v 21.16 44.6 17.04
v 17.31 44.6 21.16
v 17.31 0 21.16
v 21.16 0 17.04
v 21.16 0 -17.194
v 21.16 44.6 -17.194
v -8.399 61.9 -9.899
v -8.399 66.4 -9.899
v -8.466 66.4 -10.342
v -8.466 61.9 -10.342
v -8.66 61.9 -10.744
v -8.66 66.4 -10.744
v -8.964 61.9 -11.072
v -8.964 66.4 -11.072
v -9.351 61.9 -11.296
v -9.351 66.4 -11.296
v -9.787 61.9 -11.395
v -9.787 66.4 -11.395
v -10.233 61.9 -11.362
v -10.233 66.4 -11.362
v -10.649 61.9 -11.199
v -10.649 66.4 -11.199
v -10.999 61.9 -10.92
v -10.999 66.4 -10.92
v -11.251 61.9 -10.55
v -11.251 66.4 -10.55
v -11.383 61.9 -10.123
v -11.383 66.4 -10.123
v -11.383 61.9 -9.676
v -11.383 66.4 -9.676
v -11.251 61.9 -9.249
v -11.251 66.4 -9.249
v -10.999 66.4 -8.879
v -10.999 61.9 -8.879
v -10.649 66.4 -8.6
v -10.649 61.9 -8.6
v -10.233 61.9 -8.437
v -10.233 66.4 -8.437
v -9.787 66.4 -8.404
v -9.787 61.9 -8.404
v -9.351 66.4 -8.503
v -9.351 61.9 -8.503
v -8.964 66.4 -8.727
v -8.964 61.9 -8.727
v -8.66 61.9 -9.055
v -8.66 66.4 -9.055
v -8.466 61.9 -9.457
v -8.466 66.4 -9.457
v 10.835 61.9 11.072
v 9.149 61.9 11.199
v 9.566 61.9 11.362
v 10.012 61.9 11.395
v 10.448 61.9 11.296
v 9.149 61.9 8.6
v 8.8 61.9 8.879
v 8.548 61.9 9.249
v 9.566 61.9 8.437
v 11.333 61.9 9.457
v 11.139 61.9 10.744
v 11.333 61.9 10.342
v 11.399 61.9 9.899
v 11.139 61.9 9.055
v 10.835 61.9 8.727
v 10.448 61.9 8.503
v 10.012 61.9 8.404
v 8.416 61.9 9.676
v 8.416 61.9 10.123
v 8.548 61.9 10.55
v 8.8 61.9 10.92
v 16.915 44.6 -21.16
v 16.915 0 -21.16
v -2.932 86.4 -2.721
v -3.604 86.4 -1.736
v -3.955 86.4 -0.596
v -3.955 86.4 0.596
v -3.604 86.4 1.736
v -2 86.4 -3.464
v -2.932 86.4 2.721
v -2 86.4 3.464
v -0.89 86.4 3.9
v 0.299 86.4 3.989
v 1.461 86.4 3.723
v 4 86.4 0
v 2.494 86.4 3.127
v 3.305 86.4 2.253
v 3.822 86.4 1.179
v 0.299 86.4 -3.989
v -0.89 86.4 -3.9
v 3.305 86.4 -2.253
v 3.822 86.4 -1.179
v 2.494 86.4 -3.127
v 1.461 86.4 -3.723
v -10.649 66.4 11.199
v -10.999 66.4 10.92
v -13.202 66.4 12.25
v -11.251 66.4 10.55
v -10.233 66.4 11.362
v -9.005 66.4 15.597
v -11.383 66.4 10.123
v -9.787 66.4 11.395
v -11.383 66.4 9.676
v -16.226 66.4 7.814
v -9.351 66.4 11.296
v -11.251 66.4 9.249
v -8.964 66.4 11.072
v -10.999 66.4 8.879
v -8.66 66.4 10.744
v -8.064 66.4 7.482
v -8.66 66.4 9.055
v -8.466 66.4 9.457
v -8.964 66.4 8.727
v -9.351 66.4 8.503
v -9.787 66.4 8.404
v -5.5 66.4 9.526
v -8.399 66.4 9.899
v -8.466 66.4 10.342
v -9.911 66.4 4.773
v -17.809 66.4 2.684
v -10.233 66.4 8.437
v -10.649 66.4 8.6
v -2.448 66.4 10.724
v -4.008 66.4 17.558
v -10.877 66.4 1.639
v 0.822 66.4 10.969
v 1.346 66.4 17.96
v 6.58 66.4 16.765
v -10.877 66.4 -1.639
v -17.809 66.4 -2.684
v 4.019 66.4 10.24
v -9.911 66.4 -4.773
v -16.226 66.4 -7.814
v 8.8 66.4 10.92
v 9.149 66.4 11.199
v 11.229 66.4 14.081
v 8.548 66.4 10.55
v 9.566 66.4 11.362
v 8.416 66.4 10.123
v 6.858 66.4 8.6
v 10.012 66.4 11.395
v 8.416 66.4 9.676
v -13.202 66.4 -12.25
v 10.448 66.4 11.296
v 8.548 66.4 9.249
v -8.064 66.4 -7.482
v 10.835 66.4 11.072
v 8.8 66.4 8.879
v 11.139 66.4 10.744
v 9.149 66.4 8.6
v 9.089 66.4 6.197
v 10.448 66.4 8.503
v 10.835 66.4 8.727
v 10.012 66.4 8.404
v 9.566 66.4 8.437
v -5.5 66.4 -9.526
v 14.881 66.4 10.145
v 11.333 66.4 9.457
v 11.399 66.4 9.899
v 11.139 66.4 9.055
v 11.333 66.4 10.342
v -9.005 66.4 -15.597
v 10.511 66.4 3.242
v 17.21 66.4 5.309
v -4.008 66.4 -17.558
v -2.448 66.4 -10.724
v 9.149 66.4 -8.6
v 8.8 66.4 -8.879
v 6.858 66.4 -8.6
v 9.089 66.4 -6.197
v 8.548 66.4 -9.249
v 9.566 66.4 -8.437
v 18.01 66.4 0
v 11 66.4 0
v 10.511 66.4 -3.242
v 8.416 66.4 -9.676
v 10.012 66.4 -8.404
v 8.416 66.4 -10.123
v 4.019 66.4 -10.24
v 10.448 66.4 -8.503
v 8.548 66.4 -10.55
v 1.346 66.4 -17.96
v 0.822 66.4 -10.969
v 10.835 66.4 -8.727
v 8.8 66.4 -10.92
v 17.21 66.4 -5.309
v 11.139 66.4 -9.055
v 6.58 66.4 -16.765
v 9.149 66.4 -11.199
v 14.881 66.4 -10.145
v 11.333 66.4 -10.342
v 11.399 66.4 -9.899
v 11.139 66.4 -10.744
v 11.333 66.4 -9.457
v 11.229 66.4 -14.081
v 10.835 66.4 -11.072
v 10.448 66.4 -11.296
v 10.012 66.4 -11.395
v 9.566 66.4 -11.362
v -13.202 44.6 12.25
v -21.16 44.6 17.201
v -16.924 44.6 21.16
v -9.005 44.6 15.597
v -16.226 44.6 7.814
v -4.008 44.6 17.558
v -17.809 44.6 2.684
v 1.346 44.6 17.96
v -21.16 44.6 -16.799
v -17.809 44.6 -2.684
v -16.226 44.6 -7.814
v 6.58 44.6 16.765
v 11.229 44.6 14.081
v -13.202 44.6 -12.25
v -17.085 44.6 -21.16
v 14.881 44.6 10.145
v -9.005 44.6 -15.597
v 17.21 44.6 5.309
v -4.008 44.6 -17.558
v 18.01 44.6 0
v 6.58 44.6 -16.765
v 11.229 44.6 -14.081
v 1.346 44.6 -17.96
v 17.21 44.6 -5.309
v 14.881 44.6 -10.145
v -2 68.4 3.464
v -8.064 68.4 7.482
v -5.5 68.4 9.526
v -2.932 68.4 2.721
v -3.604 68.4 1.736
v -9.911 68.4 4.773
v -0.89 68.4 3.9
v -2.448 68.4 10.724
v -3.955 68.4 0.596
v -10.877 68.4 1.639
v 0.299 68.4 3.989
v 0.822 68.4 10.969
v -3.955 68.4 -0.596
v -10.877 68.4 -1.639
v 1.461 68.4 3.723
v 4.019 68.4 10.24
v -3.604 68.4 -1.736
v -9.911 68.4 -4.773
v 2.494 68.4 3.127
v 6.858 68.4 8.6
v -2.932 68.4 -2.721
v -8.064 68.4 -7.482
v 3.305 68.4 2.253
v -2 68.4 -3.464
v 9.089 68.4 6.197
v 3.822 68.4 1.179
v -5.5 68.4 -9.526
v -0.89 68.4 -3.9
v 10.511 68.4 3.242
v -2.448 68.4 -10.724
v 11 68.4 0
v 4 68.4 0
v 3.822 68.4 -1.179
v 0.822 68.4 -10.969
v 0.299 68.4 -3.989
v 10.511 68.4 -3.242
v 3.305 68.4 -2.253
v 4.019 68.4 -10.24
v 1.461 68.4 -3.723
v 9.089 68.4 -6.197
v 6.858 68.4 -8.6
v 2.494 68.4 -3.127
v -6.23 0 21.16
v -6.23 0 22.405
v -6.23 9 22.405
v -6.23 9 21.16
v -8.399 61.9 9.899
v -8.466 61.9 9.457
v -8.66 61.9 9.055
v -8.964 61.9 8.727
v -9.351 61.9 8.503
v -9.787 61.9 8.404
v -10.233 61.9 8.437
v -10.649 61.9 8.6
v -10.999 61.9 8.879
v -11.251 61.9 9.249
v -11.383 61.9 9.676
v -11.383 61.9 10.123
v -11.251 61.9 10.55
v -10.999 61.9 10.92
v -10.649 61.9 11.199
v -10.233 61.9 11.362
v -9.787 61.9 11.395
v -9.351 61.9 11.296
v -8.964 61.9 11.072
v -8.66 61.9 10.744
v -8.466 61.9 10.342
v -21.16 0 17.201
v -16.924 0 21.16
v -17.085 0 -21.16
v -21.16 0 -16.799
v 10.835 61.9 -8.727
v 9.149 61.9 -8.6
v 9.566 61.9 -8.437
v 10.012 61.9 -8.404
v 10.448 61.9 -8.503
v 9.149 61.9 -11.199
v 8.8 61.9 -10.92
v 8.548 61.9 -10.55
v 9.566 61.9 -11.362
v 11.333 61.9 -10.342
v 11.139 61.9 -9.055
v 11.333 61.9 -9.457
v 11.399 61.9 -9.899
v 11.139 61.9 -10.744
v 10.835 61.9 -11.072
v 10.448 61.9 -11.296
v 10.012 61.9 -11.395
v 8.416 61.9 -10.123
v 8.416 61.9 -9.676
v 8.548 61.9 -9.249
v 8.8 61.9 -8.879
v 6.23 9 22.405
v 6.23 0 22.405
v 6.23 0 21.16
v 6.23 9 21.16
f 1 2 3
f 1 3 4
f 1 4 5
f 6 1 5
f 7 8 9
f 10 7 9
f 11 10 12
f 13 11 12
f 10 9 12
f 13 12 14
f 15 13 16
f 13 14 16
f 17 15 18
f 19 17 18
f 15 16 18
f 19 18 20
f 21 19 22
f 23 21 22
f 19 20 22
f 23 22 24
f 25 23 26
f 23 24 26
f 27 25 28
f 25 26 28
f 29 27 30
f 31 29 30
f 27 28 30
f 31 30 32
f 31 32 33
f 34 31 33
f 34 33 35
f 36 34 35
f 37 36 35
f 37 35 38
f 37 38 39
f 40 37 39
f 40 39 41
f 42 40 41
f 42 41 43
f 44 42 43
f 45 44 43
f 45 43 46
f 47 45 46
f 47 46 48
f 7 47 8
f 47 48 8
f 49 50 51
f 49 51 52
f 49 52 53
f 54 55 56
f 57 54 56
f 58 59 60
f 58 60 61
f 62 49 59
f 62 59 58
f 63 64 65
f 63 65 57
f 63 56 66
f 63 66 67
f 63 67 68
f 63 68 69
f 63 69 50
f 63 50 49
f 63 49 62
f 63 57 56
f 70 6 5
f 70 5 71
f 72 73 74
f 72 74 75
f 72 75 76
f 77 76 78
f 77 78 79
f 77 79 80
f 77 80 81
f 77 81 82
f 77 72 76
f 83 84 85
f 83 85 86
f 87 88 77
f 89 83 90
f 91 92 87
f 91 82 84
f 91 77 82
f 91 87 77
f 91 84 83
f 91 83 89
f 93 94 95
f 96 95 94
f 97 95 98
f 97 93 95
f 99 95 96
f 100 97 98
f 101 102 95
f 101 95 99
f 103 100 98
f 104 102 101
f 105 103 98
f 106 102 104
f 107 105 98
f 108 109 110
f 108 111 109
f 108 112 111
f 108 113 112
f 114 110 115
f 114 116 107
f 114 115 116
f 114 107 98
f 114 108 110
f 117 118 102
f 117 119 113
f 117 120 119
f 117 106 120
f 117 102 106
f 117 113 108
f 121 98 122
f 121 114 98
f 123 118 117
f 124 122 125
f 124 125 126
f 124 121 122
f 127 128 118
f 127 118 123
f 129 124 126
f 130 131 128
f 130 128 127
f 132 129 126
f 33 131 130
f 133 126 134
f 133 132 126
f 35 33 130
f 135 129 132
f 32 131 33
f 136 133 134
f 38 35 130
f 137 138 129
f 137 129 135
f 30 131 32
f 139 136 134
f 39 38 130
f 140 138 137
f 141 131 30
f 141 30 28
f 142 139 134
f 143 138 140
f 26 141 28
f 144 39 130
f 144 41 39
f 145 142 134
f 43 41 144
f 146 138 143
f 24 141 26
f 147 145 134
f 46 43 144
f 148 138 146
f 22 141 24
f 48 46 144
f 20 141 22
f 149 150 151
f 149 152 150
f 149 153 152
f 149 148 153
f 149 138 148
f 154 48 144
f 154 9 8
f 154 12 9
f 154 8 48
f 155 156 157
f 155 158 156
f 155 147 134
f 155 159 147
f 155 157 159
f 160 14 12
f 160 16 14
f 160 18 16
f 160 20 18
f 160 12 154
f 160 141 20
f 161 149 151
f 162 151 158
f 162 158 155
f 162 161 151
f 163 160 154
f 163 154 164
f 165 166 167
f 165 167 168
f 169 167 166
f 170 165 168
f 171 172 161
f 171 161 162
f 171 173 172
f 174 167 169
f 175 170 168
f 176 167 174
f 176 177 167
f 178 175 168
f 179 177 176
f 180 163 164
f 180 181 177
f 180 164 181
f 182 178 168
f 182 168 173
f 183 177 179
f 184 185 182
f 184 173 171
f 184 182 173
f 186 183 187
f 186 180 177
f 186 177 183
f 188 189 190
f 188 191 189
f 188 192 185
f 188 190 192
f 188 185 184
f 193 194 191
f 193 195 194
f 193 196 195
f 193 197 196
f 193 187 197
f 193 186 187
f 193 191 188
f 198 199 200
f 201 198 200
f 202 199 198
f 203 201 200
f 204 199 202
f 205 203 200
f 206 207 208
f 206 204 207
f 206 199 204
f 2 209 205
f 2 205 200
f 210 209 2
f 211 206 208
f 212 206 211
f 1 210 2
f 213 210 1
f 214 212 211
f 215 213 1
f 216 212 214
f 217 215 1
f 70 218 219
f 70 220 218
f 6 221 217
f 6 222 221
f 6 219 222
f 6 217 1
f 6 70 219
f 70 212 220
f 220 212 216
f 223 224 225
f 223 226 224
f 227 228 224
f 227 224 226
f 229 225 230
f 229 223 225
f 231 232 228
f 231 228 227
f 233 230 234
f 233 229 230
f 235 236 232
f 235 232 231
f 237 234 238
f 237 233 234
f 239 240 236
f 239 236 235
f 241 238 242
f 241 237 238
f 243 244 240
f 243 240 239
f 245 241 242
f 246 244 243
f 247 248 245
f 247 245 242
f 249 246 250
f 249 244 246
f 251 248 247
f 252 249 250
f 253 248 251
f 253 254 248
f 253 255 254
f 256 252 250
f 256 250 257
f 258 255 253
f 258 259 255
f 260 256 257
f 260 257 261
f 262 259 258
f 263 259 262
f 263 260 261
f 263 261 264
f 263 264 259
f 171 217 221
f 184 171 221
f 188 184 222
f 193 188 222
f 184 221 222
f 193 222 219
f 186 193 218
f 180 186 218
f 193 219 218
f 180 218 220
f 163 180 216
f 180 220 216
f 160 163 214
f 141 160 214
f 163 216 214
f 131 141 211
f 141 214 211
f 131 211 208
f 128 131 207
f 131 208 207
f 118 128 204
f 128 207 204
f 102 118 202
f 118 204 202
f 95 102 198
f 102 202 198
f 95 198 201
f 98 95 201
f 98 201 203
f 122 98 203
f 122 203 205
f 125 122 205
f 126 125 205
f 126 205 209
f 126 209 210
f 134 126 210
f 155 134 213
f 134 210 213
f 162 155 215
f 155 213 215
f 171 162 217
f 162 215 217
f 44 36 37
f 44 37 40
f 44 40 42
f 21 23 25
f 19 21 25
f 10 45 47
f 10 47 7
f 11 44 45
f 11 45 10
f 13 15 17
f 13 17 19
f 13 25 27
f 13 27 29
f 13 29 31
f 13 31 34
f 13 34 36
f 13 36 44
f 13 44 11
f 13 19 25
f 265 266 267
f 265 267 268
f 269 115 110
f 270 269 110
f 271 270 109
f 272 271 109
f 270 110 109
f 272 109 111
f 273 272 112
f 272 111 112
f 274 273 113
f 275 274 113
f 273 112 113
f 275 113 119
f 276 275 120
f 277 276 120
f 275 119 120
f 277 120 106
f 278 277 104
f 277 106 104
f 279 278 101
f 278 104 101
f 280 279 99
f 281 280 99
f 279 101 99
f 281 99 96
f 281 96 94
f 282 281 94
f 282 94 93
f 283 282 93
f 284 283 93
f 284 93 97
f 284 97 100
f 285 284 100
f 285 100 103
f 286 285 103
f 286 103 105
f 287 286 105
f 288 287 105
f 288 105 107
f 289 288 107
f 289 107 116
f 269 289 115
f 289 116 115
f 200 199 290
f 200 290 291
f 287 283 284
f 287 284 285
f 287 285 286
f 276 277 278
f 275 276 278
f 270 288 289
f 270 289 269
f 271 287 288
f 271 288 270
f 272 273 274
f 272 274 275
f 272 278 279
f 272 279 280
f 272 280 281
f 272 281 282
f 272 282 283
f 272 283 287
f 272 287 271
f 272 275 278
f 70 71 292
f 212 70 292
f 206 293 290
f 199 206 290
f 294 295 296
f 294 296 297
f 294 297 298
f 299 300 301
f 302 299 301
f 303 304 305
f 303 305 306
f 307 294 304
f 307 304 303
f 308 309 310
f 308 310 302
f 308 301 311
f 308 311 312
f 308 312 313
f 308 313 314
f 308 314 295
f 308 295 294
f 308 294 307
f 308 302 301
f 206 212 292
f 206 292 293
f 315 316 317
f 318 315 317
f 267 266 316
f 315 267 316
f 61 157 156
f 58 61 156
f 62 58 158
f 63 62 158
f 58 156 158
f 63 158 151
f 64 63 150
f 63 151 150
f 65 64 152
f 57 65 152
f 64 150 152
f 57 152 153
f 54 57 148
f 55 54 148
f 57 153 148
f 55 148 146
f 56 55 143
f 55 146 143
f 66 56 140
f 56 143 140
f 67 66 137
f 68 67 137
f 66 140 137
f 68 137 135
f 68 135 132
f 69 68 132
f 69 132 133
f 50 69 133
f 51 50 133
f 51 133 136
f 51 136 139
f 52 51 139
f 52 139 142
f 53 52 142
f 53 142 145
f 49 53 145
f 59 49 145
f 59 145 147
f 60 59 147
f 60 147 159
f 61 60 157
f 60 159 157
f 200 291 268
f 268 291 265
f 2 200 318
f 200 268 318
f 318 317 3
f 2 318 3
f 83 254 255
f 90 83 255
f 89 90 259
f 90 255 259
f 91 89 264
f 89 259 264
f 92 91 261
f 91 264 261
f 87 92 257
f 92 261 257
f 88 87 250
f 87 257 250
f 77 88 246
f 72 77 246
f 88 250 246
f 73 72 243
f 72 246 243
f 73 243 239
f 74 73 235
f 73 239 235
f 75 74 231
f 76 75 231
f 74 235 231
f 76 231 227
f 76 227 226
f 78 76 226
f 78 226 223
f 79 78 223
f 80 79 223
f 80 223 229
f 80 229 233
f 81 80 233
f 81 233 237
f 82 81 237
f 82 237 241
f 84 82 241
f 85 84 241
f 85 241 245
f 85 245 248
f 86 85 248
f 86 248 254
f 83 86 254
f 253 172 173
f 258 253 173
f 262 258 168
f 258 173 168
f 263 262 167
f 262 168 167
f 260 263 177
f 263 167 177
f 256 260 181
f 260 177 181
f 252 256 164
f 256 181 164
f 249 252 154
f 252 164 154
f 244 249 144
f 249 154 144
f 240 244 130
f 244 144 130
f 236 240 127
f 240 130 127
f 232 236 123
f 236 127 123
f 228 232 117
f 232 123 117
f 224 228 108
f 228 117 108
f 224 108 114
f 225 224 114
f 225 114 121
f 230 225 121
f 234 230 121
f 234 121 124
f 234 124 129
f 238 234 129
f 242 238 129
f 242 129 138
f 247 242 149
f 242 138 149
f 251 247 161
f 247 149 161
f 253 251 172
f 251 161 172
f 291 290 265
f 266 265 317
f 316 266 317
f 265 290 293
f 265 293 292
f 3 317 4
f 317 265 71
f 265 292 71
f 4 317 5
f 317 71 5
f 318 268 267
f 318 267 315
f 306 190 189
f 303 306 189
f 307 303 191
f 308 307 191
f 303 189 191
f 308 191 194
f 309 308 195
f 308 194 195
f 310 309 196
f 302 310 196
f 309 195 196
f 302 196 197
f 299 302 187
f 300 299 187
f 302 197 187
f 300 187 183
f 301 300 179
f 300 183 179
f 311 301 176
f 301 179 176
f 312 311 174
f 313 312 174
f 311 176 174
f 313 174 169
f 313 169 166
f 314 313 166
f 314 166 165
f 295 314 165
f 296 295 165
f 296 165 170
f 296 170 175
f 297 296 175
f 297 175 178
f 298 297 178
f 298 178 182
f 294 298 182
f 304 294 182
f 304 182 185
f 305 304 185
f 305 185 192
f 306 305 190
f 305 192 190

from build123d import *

# Parameters (mm, degrees)
SKETCH1_R           = 18.01
SKETCH1_R_2         = 11
SKETCH1_R_3         = 1.5
SKETCH1_R_4         = 4
BOSS_EXTRUDE1_DEPTH = 44.6
BOSS_EXTRUDE2_START = 44.6
SKETCH1_3_R         = 18.01
SKETCH1_3_R_2       = 11
SKETCH1_3_R_3       = 1.5
SKETCH1_3_R_4       = 4
BOSS_EXTRUDE2_DEPTH = 21.8
BOSS_EXTRUDE3_START = 66.4
SKETCH1_4_R         = 11
SKETCH1_4_R_2       = 4
BOSS_EXTRUDE3_DEPTH = 2
CUT_EXTRUDE1_START  = 66.4
SKETCH1_5_R         = 1.5
CUT_EXTRUDE1_DEPTH  = 4.5
BOSS_EXTRUDE4_START = 66.4
SKETCH1_6_R         = 4
BOSS_EXTRUDE4_DEPTH = 20
SKETCH1_7_W         = 12.459329624
SKETCH1_7_H         = 1.245276847
BOSS_EXTRUDE5_DEPTH = 9


with BuildPart() as part:
    # Sketch1 → Boss-Extrude1 (new body)
    with BuildSketch(Plane(origin=(0, 0, 0), x_dir=(1, 0, 0), z_dir=(0, 1, 0))):
        Polygon((-17.084609899, 21.16), (-21.16, 16.798777214), (-21.16, -17.201222786), (-16.923568895, -21.16), (-6.229664812, -21.16), (6.229664812, -21.16), (17.310192914, -21.16), (21.16, -17.040181782), (21.16, 17.193580027), (16.915390101, 21.16), align=None)
        Circle(SKETCH1_R, mode=Mode.SUBTRACT)
        Circle(SKETCH1_R)
        Circle(SKETCH1_R_2, mode=Mode.SUBTRACT)
        with Locations((-9.899494937, 9.899494937)):
            Circle(SKETCH1_R_3, mode=Mode.SUBTRACT)
        with Locations((-9.899494937, -9.899494937)):
            Circle(SKETCH1_R_3, mode=Mode.SUBTRACT)
        with Locations((9.899494937, -9.899494937)):
            Circle(SKETCH1_R_3, mode=Mode.SUBTRACT)
        with Locations((9.899494937, 9.899494937)):
            Circle(SKETCH1_R_3, mode=Mode.SUBTRACT)
        Circle(SKETCH1_R_2)
        Circle(SKETCH1_R_4, mode=Mode.SUBTRACT)
        with Locations((9.899494937, 9.899494937)):
            Circle(SKETCH1_R_3)
        with Locations((9.899494937, -9.899494937)):
            Circle(SKETCH1_R_3)
        with Locations((-9.899494937, -9.899494937)):
            Circle(SKETCH1_R_3)
        with Locations((-9.899494937, 9.899494937)):
            Circle(SKETCH1_R_3)
        Circle(SKETCH1_R_4)
    extrude(amount=BOSS_EXTRUDE1_DEPTH)

    # Sketch1<3> → Boss-Extrude2 (add)
    with BuildSketch(Plane(origin=(0, 0, 0), x_dir=(1, 0, 0), z_dir=(0, 1, 0)).offset(BOSS_EXTRUDE2_START)):
        Circle(SKETCH1_3_R)
        Circle(SKETCH1_3_R_2, mode=Mode.SUBTRACT)
        with Locations((-9.899494937, 9.899494937)):
            Circle(SKETCH1_3_R_3, mode=Mode.SUBTRACT)
        with Locations((-9.899494937, -9.899494937)):
            Circle(SKETCH1_3_R_3, mode=Mode.SUBTRACT)
        with Locations((9.899494937, -9.899494937)):
            Circle(SKETCH1_3_R_3, mode=Mode.SUBTRACT)
        with Locations((9.899494937, 9.899494937)):
            Circle(SKETCH1_3_R_3, mode=Mode.SUBTRACT)
        Circle(SKETCH1_3_R_2)
        Circle(SKETCH1_3_R_4, mode=Mode.SUBTRACT)
        with Locations((-9.899494937, -9.899494937)):
            Circle(SKETCH1_3_R_3)
        with Locations((9.899494937, -9.899494937)):
            Circle(SKETCH1_3_R_3)
        with Locations((9.899494937, 9.899494937)):
            Circle(SKETCH1_3_R_3)
        with Locations((-9.899494937, 9.899494937)):
            Circle(SKETCH1_3_R_3)
        Circle(SKETCH1_3_R_4)
    extrude(amount=BOSS_EXTRUDE2_DEPTH)

    # Sketch1<4> → Boss-Extrude3 (add)
    with BuildSketch(Plane(origin=(0, 0, 0), x_dir=(1, 0, 0), z_dir=(0, 1, 0)).offset(BOSS_EXTRUDE3_START)):
        Circle(SKETCH1_4_R)
        Circle(SKETCH1_4_R_2, mode=Mode.SUBTRACT)
        Circle(SKETCH1_4_R_2)
    extrude(amount=BOSS_EXTRUDE3_DEPTH)

    # Sketch1<5> → Cut-Extrude1 (cut)
    with BuildSketch(Plane(origin=(0, 0, 0), x_dir=(1, 0, 0), z_dir=(0, 1, 0)).offset(CUT_EXTRUDE1_START)):
        with Locations((9.899494937, -9.899494937)):
            Circle(SKETCH1_5_R)
        with Locations((9.899494937, 9.899494937)):
            Circle(SKETCH1_5_R)
        with Locations((-9.899494937, 9.899494937)):
            Circle(SKETCH1_5_R)
        with Locations((-9.899494937, -9.899494937)):
            Circle(SKETCH1_5_R)
    extrude(amount=-CUT_EXTRUDE1_DEPTH, mode=Mode.SUBTRACT)

    # Sketch1<6> → Boss-Extrude4 (add)
    with BuildSketch(Plane(origin=(0, 0, 0), x_dir=(1, 0, 0), z_dir=(0, 1, 0)).offset(BOSS_EXTRUDE4_START)):
        Circle(SKETCH1_6_R)
    extrude(amount=BOSS_EXTRUDE4_DEPTH)

    # Sketch1<7> → Boss-Extrude5 (add)
    with BuildSketch(Plane(origin=(0, 0, 0), x_dir=(1, 0, 0), z_dir=(0, 1, 0))):
        with Locations((0, -21.782638423)):
            Rectangle(SKETCH1_7_W, SKETCH1_7_H)
    extrude(amount=BOSS_EXTRUDE5_DEPTH)


solid = part.part
